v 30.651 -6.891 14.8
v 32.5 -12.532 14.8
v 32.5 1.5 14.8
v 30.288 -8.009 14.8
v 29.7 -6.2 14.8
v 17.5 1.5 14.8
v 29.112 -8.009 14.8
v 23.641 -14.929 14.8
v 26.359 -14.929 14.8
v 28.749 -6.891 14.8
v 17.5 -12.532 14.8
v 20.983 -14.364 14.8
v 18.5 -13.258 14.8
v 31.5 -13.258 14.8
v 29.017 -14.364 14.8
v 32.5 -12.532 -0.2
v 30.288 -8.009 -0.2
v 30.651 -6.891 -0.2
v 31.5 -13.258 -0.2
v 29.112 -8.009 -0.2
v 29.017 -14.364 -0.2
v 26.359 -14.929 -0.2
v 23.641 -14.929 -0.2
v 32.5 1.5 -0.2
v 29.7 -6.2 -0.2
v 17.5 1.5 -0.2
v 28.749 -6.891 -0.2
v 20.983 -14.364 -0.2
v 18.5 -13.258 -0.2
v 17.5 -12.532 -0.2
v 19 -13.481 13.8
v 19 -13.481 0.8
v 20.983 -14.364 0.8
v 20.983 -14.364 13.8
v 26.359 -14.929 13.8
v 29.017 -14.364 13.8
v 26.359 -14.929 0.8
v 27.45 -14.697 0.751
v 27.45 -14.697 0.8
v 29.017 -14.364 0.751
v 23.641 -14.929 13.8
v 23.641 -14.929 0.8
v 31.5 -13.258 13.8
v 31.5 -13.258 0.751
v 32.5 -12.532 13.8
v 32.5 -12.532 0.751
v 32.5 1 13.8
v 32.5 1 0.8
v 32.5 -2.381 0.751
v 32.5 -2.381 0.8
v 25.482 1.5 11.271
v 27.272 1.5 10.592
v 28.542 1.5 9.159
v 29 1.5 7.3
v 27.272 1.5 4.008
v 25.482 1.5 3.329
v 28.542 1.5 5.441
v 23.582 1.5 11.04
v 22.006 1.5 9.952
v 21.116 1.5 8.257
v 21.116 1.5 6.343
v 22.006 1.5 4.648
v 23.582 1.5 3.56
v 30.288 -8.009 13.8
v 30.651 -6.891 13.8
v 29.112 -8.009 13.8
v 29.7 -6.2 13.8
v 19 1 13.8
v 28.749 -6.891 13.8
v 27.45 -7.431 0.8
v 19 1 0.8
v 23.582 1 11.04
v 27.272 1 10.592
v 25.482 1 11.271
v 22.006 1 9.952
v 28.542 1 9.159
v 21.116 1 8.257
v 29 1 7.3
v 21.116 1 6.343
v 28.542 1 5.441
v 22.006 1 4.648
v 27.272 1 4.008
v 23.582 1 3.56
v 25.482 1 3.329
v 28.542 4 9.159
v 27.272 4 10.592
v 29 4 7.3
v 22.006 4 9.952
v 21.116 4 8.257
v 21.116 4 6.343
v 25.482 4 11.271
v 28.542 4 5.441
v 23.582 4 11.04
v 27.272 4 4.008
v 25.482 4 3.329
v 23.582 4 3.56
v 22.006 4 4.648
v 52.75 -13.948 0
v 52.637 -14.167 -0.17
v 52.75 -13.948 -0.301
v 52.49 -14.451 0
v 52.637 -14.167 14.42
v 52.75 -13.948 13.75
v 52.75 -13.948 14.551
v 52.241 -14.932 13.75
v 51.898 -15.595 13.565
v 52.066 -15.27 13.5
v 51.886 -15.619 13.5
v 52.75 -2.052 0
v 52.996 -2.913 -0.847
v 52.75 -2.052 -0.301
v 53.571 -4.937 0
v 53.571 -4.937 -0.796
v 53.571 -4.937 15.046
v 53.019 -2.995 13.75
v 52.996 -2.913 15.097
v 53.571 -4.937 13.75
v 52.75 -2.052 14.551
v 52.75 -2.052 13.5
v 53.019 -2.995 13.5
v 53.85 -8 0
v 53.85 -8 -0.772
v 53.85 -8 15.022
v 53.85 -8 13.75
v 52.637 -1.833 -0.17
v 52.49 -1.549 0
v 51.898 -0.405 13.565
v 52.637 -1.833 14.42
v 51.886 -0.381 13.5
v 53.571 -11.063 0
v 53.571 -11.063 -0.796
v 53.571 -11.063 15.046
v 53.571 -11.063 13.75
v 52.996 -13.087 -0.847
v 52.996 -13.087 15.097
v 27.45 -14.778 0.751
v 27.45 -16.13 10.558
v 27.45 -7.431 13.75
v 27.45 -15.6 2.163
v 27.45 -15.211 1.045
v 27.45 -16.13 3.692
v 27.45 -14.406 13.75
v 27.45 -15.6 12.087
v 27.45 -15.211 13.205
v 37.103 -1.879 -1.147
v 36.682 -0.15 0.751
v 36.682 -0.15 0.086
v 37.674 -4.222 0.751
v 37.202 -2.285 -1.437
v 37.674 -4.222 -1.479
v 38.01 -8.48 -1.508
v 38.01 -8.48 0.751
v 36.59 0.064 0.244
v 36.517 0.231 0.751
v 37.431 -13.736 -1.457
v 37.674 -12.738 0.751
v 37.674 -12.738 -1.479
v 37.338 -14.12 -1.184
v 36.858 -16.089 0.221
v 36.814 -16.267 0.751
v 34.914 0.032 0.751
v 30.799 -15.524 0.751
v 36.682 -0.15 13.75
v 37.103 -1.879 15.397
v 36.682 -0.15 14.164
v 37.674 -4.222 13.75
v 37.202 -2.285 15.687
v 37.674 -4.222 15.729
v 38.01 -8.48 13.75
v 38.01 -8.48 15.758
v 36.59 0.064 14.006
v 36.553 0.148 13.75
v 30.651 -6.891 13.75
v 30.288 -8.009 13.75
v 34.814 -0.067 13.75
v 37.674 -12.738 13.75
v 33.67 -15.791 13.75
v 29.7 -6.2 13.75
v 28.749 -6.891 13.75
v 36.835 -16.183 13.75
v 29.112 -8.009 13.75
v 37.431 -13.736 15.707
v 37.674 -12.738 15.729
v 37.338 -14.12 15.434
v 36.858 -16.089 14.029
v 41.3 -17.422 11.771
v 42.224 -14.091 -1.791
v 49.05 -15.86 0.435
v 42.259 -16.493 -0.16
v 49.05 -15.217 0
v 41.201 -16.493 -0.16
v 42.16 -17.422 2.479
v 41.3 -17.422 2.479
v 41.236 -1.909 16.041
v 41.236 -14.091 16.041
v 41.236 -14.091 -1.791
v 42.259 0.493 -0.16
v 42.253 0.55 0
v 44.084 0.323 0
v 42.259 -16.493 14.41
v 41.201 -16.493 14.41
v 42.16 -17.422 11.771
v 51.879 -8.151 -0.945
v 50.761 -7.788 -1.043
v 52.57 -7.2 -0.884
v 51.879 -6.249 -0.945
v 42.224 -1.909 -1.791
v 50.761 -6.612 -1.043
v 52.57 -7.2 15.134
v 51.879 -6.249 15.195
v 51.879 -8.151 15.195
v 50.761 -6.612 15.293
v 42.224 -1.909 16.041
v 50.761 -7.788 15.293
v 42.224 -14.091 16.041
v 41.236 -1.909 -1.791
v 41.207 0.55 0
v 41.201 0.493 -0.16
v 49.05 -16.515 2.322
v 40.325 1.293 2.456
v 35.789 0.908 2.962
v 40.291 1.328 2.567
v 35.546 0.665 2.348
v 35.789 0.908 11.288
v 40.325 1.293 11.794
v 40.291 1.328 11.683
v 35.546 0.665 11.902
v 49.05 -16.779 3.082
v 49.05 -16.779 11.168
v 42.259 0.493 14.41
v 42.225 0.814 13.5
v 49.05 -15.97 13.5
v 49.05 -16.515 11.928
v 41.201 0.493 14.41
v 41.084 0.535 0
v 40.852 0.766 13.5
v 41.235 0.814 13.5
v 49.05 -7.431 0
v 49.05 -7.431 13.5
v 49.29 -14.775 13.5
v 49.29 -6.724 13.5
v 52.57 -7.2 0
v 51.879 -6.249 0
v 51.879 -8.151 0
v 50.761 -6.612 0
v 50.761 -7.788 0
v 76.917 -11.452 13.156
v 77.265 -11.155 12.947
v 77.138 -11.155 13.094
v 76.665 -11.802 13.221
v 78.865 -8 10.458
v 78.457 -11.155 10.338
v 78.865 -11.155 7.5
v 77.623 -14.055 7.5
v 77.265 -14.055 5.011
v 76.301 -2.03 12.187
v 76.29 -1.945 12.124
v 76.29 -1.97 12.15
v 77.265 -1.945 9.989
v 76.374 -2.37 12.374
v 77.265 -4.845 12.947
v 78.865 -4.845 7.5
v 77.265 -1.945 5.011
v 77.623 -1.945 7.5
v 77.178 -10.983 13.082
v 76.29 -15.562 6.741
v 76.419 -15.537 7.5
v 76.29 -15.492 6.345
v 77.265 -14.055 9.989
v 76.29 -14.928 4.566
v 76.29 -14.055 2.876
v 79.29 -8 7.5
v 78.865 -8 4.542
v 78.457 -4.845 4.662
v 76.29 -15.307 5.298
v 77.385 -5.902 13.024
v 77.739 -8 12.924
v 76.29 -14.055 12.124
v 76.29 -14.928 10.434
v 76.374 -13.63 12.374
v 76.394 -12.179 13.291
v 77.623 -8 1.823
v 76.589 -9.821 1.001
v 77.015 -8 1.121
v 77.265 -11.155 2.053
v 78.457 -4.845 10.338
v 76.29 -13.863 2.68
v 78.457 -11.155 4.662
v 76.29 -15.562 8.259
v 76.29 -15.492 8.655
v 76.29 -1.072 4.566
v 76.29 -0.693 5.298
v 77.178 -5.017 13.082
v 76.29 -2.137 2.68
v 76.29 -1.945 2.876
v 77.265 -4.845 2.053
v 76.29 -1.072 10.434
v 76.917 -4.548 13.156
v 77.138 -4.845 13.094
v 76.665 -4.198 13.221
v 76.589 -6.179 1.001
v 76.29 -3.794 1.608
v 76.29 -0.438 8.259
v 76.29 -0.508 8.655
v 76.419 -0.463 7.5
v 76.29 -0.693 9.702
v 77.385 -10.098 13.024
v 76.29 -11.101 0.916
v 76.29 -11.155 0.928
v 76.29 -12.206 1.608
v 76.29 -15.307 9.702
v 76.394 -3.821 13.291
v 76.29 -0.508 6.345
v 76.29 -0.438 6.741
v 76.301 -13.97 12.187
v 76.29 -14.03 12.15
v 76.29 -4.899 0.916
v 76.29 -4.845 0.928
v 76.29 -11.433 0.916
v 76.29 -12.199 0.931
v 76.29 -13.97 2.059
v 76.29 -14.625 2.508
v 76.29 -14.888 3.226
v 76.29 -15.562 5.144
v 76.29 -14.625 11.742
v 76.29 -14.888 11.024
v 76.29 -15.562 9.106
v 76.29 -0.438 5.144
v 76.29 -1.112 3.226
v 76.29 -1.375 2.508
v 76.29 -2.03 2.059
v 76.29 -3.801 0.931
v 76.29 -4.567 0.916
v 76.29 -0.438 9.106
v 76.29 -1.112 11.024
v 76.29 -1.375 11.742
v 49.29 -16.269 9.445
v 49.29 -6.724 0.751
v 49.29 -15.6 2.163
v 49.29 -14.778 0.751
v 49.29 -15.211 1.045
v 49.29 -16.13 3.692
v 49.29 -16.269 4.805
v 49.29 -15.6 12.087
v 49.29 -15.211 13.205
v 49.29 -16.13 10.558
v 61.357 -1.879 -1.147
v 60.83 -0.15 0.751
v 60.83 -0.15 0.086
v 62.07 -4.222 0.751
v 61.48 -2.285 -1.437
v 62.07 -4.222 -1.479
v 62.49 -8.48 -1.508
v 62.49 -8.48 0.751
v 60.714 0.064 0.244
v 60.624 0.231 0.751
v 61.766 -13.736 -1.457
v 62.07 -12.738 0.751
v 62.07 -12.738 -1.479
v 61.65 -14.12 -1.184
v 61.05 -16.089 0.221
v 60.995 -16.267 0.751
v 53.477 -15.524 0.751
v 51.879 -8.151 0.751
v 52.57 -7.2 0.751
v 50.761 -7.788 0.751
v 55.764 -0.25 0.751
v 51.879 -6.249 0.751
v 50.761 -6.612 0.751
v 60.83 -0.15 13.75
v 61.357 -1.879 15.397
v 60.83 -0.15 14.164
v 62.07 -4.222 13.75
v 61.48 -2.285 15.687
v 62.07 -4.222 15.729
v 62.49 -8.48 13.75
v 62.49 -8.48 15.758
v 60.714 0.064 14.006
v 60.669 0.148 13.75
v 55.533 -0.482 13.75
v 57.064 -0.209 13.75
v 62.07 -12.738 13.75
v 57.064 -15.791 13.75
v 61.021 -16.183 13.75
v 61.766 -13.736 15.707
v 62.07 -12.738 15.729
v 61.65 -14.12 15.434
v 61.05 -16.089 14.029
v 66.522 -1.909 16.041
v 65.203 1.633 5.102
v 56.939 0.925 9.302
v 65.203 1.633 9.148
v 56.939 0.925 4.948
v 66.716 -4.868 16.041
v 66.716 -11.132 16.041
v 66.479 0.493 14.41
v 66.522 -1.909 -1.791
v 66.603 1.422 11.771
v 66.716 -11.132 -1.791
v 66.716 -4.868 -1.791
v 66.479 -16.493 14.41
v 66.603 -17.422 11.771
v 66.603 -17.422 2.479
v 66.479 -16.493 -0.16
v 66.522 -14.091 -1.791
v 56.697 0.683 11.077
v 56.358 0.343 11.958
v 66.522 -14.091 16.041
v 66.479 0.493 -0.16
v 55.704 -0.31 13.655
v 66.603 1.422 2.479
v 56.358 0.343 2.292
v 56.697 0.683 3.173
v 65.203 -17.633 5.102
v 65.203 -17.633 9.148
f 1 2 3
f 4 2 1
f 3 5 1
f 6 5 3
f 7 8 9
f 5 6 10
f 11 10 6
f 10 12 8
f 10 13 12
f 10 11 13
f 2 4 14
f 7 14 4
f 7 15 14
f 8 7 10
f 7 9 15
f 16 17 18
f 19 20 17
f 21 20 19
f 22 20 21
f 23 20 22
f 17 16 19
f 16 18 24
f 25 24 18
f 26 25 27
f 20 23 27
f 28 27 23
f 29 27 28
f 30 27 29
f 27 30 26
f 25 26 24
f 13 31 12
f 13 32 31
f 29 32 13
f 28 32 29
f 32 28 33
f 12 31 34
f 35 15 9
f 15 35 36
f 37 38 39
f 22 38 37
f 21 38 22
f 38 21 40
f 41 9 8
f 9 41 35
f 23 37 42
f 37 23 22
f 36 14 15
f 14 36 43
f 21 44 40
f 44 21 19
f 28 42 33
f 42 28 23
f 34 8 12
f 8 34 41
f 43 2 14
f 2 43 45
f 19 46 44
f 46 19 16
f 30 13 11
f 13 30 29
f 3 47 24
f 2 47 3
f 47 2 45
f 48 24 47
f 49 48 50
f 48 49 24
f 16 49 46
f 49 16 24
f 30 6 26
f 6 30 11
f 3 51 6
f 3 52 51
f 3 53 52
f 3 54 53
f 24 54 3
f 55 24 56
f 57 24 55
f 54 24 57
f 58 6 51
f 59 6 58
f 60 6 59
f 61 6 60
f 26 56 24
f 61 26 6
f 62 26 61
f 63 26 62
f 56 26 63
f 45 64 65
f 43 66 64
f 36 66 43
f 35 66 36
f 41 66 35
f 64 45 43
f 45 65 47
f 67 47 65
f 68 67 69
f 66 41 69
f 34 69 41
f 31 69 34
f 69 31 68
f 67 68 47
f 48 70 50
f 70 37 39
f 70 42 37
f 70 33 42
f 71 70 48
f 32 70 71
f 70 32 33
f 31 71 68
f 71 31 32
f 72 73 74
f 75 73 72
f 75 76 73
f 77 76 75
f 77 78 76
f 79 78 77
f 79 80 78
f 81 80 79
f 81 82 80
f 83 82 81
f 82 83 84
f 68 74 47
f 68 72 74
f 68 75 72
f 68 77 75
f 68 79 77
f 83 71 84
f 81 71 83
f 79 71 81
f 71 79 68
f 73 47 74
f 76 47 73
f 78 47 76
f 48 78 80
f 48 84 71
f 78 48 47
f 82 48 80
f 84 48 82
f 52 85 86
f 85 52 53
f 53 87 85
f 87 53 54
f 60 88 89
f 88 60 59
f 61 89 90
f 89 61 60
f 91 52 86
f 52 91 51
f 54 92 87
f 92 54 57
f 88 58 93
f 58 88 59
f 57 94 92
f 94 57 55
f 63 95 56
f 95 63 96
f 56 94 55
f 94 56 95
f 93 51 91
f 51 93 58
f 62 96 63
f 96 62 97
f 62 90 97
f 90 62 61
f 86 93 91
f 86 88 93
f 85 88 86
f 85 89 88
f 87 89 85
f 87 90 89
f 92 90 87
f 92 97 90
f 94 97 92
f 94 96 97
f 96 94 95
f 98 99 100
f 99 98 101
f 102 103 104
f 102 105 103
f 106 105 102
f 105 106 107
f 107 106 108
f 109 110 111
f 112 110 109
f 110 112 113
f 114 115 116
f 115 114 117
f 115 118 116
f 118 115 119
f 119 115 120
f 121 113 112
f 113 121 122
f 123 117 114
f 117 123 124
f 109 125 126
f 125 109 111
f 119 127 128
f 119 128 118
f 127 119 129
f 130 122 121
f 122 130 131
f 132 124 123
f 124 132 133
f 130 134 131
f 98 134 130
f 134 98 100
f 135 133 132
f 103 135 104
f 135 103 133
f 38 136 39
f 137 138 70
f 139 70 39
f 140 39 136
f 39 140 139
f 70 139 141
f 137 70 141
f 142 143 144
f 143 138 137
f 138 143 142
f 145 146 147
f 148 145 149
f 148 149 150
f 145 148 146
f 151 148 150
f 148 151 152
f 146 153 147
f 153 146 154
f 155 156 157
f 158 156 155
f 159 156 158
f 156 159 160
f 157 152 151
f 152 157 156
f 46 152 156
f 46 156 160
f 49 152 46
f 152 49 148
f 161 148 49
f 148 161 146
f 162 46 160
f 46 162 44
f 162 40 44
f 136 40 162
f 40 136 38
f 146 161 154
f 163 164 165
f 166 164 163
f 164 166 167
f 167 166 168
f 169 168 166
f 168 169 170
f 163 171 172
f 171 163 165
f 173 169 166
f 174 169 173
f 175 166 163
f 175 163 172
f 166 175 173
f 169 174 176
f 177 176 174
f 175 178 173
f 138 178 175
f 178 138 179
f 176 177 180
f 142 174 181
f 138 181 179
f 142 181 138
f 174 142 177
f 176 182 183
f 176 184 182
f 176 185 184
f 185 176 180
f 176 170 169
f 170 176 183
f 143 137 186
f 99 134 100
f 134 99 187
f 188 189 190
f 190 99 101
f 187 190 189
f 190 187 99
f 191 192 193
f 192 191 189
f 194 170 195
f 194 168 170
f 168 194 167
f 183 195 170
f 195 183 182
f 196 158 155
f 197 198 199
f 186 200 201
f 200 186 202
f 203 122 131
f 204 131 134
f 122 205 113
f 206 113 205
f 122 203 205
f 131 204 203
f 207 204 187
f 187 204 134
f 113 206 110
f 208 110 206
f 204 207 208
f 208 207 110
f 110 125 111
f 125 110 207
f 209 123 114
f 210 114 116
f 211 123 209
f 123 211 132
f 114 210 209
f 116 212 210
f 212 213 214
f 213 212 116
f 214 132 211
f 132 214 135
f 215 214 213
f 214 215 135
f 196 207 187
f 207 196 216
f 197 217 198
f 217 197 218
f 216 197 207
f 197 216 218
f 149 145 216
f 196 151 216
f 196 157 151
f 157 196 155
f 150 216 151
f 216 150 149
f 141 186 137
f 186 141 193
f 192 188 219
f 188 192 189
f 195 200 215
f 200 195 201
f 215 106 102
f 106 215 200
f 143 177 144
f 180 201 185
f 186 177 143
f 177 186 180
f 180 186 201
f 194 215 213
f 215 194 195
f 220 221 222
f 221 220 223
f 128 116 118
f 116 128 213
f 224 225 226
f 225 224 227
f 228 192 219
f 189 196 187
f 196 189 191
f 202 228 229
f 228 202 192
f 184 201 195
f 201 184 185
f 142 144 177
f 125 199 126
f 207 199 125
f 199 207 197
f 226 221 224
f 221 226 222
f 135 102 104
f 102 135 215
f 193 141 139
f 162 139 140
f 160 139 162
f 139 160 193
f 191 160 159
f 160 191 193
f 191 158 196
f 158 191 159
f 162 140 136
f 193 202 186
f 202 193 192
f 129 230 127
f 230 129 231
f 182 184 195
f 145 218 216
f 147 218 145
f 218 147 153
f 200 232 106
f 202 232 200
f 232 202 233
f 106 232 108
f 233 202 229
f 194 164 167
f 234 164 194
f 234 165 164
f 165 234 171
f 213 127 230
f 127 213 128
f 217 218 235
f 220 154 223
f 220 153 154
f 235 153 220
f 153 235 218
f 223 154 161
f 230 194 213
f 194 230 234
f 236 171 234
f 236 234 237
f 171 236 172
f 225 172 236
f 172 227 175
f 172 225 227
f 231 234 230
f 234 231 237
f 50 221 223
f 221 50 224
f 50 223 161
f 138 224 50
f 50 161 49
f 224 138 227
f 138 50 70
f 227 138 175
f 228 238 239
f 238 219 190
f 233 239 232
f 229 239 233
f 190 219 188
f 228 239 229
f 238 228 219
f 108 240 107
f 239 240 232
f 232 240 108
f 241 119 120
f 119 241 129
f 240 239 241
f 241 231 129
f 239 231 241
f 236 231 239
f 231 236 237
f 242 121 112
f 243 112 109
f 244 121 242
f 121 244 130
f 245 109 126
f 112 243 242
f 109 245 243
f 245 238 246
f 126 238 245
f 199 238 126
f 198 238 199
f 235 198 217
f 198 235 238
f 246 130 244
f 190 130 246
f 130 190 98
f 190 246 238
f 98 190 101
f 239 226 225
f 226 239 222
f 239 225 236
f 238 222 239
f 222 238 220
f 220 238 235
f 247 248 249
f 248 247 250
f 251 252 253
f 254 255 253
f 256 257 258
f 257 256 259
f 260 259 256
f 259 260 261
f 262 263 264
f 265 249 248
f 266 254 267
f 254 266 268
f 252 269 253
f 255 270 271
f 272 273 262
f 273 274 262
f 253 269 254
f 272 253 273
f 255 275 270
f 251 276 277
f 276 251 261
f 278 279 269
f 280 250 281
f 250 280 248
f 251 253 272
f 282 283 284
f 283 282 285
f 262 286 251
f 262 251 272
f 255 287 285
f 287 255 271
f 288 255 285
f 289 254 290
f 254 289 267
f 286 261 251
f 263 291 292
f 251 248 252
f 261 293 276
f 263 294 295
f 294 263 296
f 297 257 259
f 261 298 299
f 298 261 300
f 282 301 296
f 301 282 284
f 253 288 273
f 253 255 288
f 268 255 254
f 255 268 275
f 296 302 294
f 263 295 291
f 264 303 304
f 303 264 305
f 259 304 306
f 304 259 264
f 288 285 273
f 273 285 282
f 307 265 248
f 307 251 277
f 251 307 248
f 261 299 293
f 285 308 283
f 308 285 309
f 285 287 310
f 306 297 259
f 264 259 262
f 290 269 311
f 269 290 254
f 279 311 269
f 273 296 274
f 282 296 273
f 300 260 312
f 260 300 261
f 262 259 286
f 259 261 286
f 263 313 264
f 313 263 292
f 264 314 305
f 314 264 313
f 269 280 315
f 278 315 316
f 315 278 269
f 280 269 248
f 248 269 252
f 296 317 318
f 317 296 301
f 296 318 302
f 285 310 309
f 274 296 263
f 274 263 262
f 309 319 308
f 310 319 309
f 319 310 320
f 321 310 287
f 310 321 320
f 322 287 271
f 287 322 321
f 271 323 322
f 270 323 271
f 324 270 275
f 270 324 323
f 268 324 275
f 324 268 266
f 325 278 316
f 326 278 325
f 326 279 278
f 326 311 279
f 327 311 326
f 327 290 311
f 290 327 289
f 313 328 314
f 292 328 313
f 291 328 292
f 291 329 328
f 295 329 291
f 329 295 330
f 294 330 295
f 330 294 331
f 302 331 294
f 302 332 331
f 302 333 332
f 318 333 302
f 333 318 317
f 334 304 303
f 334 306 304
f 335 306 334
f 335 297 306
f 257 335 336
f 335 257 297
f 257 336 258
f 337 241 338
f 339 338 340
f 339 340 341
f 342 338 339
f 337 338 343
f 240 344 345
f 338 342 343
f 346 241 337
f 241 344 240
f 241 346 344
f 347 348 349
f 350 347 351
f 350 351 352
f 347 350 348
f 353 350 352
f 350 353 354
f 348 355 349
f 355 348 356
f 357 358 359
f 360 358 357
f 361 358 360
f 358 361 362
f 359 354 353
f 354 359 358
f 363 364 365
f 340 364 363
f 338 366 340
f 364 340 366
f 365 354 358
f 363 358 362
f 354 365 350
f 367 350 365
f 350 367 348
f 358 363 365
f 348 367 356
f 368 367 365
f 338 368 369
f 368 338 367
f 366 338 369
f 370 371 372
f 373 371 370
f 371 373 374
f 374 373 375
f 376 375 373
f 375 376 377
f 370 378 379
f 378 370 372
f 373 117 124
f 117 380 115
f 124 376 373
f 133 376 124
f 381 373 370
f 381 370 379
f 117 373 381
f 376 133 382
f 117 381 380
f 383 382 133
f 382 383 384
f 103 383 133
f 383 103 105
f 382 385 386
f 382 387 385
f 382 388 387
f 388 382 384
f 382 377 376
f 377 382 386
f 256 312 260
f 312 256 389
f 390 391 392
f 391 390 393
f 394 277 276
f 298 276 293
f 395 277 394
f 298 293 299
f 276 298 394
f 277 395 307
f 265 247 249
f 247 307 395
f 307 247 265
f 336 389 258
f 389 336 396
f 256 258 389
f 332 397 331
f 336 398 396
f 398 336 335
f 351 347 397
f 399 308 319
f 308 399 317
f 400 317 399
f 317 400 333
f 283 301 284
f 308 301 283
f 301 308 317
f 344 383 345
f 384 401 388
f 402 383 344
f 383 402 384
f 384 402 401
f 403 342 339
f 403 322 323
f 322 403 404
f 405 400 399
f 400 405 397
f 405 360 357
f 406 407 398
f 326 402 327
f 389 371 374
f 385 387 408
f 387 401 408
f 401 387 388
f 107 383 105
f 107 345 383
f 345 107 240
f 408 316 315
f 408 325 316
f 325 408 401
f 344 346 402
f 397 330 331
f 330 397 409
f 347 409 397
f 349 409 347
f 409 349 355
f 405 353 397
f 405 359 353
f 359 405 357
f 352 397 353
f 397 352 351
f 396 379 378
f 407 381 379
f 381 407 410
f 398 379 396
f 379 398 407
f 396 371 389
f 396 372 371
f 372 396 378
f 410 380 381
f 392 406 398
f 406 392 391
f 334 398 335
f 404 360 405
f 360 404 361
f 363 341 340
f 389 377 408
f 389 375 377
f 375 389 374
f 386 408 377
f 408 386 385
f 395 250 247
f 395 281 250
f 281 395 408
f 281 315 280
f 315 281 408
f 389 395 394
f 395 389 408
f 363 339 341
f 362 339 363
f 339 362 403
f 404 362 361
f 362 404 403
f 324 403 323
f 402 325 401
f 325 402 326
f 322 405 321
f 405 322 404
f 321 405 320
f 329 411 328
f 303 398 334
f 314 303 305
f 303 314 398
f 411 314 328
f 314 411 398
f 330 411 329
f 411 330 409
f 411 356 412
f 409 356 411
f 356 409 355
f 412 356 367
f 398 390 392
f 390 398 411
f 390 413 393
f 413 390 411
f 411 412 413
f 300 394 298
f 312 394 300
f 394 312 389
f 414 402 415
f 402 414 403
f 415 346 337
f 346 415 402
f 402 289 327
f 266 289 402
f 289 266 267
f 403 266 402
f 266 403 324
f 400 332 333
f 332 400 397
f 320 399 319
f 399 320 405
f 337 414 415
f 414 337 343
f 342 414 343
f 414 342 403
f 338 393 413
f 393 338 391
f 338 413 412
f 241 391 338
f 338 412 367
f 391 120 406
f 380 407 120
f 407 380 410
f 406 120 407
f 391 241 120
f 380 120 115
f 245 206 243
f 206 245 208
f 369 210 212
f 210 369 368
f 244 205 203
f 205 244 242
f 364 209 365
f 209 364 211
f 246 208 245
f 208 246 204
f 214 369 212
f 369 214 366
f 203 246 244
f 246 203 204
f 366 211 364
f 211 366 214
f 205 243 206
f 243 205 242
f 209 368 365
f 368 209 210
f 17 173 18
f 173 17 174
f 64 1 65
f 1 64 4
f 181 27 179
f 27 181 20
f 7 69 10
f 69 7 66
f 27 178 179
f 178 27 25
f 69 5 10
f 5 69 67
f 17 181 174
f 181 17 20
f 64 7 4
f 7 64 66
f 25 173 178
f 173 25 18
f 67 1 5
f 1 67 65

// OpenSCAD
// file: util/finger-tip.scad
module fingertip(length,x,y,z,padding,width)
{ 
	difference() {
		scale([y,x,z]) {
			intersection() {
                difference() {
                    union() {
                        translate([length-5,5,5]) sphere(r =7);
                        translate([0,-5,-5]) cube([length,width + 10,20]);
                    }
                    //cutout for the side
                        translate([-4,-width+0.001,5.3]) rotate([-90,0,0]) cylinder(r=12.8,h=10);
                        translate([-4,width - padding*(1/x),5.3]) rotate([-90,0,0]) cylinder(r=12.8,h=10);
                }
                hull() {
                    for(i=[-1,1], j=[-1,1]) {
                        //angled cylinders to provide the outer shape of the finger
                        translate([length/10,i*2.4 + width/2,j*2.2 + 5]) rotate([i*j*-4,j*86,0]) cylinder(d=6,h=20,center=true);
                        //tip part
                        translate([length-3, i + width/2, j*2.2 + 5])rotate([i*j*-4,j*-80,0]) cylinder(d=6,h=10,center=true);  
                    }
                }              
            } 
		}
        translate([0,padding/2 * x,0])              
        cut_fingerbase(width-padding,x,z);
	}
}

module cut_fingerbase(width,x,z) {
	translate([-13/z,0,0]) rotate([0,45,0]) translate([-50,0,0]) cube([100,width*x, 10.5]);
}

rotate([0,-90,0]) fingertip(20,1.5,1.5,1.6,0.5,9.5);
// file: util/finger-base.scad
module fingerbase(length,x,y,z,padding,width)
{ 
	difference() {
		scale([y,x,z]) {
			intersection() {
                difference() {
                    union() {
                        translate([length-4,-5,5]) rotate([-90,0,0]) cylinder(r=8,h=width + 10);
                        translate([0,-5,-5]) cube([length,width + 10,20]);
                    }
                    //cutout for the side
                        translate([-4,-width+0.001,5.3]) rotate([-90,0,0]) cylinder(r=12.8,h=10);
                        translate([-4,width - padding*(1/x),5.3]) rotate([-90,0,0]) cylinder(r=12.8,h=10);
                }
                
                hull() {
                    for(i=[-1,1], j=[-1,1]) {
                        //angled cylinders to provide the outer shape of the finger
                        translate([length/10,i*2.4 + width/2,j*2.2 + 5]) rotate([i*j*-4,j*86,0]) cylinder(d=6,h=20,center=true);
                        translate([length+4, i*2.4 + width/2, j*2.2 + 5]) rotate([i*j*-4,j*-86,0]) cylinder(d=6,h=20,center=true);
                    }
                }
            } 
		}
        translate([0,padding/2 * x,0])              
        cut_fingerbase(width-padding,x,z);
        translate([length * y,0,0]) 
        mirror([1,0,0])cut_fingerbase(width-padding,x,z);
	}
}

module cut_fingerbase(width,x,z) {
	//cubic parts
	translate([-100,0,0]) cube([100,width*x,100]);
	translate([-13/z,0,0]) rotate([0,45,0]) translate([-50,0,0]) cube([100,width*x, 11]);
}

//fingerbase(20,1.5,1.5,1.6,0.5,9.5);
fingerbase(20,1.5,1.5,1.6,0.5,9.5);
// file: finger-middle.scad
use <util/finger-base.scad>;
use <util/finger-tip.scad>;

module middlefinger(length,x,y,z,angle){
    difference(){
        union(){
            //base object
            fingerbase(length,x,y-0.3,z,0.5,9.5);
            
            //rotate object
            //starting point t=0
            translate([length*1.38,0,length*0.4])
            //rotate
            rotate([0,angle*$t,0])
            //rotate axis in the object
            translate([-length/6,0,-length/2.5])
            fingertip(length,x,y,z,0.5,9.5);
        }
        translate([length*1.34,length*1.5,length*0.4])
        rotate([90,0,0])
        cylinder(h=50,r=1);
    }
}

middlefinger(20,1.5,1.5,1.6,90);
// main file
use <finger-middle.scad>;

module thumbbase(){
    translate([25,1,7.3])
    union(){
        difference(){
            translate([0,-8,0])
            intersection(){
                cube([15,17,16],center=true);
                translate([0,5,0])
                union(){
                    translate([0,20,0])
                    cube([15,15,15],center=true);
                    cylinder(h=15,r=13,center=true);
                }
            }
            translate([1.5,-9,0])
            cube([15,18,13],center=true);
        }
        translate([0,1.5,0])
        rotate([90,0,0])
        cylinder(h=3,r=4,center=true);
    }
}

module thumbjoint(angle1,angle2){
    length=18;
    x=1.5;
    y=1.5;
    z=1.6;
    
    difference(){
        union(){
            //base object
            thumbbase();
            
            //rotate object
            rotate([90,0,0])
            //starting point t=0
            translate([length*1.65,0,length*0.4])
            //rotate
            rotate([0,-angle1*$t,0])
            //rotate point in the object
            translate([-length/8,0,-length/2.5])
            middlefinger(length,x,y,z,angle2);
        }
        translate([length*1.65,-length*0.4,-length])
        rotate([0,0,90])
        cylinder(h=50,r=1);
    }
}

thumbjoint(90,90);
